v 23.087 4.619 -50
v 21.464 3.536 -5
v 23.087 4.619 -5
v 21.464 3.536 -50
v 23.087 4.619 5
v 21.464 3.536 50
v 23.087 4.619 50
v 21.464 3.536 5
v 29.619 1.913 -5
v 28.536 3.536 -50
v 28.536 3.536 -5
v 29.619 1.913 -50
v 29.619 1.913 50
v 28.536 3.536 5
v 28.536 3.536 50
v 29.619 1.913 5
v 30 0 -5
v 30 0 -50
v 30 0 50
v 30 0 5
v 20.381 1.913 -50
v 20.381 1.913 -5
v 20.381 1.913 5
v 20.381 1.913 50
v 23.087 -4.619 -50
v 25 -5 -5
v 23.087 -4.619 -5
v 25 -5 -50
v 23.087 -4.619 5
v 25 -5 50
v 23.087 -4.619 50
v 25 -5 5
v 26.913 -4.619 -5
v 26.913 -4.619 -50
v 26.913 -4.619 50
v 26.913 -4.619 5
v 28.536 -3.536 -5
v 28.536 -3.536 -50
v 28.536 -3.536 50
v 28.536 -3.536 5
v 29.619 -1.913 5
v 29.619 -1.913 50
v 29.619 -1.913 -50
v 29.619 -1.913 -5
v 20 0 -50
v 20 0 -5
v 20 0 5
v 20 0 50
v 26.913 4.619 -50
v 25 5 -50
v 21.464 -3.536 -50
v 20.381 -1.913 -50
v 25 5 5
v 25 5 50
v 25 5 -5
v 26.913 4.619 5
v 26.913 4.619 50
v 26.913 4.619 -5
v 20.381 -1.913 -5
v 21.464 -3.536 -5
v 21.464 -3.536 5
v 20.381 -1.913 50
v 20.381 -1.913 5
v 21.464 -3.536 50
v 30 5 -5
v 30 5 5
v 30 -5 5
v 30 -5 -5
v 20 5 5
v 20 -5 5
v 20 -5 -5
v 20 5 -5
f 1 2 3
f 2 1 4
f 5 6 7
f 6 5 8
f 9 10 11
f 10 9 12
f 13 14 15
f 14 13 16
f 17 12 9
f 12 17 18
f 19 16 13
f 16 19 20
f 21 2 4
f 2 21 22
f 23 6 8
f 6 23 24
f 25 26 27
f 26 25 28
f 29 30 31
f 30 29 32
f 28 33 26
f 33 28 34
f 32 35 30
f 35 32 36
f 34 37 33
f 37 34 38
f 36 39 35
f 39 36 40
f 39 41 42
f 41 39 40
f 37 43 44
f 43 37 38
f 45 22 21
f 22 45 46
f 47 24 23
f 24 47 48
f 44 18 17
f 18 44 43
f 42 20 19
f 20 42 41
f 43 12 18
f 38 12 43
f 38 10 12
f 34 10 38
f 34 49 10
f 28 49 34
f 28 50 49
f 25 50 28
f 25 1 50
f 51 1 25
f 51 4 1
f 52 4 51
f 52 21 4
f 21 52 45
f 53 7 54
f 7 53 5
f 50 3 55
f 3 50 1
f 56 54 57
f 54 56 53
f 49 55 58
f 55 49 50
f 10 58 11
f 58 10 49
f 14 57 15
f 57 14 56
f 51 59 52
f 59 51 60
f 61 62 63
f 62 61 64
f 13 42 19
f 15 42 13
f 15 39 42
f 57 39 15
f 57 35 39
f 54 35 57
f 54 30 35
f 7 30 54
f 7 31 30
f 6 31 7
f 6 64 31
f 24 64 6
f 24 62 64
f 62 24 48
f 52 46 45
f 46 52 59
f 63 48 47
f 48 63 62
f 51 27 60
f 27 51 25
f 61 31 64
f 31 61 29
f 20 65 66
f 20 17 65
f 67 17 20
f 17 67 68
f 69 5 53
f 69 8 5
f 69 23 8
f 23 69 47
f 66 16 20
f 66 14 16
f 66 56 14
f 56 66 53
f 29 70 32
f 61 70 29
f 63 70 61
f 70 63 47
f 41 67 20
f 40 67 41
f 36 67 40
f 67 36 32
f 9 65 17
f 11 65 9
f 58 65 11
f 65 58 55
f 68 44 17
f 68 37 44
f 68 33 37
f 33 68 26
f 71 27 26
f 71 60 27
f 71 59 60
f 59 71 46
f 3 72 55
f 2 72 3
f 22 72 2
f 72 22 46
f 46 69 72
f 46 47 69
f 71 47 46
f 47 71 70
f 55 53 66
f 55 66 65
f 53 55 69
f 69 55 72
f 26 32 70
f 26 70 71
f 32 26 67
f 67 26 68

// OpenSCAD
module hole(size) {
	cylinder(r = size, h = 100, center = true); 
} 

translate([25, 0, 0]) {
	hole(5); 
	color("red") 
		cube(size=[10, 10, 10], center=true); 
}
